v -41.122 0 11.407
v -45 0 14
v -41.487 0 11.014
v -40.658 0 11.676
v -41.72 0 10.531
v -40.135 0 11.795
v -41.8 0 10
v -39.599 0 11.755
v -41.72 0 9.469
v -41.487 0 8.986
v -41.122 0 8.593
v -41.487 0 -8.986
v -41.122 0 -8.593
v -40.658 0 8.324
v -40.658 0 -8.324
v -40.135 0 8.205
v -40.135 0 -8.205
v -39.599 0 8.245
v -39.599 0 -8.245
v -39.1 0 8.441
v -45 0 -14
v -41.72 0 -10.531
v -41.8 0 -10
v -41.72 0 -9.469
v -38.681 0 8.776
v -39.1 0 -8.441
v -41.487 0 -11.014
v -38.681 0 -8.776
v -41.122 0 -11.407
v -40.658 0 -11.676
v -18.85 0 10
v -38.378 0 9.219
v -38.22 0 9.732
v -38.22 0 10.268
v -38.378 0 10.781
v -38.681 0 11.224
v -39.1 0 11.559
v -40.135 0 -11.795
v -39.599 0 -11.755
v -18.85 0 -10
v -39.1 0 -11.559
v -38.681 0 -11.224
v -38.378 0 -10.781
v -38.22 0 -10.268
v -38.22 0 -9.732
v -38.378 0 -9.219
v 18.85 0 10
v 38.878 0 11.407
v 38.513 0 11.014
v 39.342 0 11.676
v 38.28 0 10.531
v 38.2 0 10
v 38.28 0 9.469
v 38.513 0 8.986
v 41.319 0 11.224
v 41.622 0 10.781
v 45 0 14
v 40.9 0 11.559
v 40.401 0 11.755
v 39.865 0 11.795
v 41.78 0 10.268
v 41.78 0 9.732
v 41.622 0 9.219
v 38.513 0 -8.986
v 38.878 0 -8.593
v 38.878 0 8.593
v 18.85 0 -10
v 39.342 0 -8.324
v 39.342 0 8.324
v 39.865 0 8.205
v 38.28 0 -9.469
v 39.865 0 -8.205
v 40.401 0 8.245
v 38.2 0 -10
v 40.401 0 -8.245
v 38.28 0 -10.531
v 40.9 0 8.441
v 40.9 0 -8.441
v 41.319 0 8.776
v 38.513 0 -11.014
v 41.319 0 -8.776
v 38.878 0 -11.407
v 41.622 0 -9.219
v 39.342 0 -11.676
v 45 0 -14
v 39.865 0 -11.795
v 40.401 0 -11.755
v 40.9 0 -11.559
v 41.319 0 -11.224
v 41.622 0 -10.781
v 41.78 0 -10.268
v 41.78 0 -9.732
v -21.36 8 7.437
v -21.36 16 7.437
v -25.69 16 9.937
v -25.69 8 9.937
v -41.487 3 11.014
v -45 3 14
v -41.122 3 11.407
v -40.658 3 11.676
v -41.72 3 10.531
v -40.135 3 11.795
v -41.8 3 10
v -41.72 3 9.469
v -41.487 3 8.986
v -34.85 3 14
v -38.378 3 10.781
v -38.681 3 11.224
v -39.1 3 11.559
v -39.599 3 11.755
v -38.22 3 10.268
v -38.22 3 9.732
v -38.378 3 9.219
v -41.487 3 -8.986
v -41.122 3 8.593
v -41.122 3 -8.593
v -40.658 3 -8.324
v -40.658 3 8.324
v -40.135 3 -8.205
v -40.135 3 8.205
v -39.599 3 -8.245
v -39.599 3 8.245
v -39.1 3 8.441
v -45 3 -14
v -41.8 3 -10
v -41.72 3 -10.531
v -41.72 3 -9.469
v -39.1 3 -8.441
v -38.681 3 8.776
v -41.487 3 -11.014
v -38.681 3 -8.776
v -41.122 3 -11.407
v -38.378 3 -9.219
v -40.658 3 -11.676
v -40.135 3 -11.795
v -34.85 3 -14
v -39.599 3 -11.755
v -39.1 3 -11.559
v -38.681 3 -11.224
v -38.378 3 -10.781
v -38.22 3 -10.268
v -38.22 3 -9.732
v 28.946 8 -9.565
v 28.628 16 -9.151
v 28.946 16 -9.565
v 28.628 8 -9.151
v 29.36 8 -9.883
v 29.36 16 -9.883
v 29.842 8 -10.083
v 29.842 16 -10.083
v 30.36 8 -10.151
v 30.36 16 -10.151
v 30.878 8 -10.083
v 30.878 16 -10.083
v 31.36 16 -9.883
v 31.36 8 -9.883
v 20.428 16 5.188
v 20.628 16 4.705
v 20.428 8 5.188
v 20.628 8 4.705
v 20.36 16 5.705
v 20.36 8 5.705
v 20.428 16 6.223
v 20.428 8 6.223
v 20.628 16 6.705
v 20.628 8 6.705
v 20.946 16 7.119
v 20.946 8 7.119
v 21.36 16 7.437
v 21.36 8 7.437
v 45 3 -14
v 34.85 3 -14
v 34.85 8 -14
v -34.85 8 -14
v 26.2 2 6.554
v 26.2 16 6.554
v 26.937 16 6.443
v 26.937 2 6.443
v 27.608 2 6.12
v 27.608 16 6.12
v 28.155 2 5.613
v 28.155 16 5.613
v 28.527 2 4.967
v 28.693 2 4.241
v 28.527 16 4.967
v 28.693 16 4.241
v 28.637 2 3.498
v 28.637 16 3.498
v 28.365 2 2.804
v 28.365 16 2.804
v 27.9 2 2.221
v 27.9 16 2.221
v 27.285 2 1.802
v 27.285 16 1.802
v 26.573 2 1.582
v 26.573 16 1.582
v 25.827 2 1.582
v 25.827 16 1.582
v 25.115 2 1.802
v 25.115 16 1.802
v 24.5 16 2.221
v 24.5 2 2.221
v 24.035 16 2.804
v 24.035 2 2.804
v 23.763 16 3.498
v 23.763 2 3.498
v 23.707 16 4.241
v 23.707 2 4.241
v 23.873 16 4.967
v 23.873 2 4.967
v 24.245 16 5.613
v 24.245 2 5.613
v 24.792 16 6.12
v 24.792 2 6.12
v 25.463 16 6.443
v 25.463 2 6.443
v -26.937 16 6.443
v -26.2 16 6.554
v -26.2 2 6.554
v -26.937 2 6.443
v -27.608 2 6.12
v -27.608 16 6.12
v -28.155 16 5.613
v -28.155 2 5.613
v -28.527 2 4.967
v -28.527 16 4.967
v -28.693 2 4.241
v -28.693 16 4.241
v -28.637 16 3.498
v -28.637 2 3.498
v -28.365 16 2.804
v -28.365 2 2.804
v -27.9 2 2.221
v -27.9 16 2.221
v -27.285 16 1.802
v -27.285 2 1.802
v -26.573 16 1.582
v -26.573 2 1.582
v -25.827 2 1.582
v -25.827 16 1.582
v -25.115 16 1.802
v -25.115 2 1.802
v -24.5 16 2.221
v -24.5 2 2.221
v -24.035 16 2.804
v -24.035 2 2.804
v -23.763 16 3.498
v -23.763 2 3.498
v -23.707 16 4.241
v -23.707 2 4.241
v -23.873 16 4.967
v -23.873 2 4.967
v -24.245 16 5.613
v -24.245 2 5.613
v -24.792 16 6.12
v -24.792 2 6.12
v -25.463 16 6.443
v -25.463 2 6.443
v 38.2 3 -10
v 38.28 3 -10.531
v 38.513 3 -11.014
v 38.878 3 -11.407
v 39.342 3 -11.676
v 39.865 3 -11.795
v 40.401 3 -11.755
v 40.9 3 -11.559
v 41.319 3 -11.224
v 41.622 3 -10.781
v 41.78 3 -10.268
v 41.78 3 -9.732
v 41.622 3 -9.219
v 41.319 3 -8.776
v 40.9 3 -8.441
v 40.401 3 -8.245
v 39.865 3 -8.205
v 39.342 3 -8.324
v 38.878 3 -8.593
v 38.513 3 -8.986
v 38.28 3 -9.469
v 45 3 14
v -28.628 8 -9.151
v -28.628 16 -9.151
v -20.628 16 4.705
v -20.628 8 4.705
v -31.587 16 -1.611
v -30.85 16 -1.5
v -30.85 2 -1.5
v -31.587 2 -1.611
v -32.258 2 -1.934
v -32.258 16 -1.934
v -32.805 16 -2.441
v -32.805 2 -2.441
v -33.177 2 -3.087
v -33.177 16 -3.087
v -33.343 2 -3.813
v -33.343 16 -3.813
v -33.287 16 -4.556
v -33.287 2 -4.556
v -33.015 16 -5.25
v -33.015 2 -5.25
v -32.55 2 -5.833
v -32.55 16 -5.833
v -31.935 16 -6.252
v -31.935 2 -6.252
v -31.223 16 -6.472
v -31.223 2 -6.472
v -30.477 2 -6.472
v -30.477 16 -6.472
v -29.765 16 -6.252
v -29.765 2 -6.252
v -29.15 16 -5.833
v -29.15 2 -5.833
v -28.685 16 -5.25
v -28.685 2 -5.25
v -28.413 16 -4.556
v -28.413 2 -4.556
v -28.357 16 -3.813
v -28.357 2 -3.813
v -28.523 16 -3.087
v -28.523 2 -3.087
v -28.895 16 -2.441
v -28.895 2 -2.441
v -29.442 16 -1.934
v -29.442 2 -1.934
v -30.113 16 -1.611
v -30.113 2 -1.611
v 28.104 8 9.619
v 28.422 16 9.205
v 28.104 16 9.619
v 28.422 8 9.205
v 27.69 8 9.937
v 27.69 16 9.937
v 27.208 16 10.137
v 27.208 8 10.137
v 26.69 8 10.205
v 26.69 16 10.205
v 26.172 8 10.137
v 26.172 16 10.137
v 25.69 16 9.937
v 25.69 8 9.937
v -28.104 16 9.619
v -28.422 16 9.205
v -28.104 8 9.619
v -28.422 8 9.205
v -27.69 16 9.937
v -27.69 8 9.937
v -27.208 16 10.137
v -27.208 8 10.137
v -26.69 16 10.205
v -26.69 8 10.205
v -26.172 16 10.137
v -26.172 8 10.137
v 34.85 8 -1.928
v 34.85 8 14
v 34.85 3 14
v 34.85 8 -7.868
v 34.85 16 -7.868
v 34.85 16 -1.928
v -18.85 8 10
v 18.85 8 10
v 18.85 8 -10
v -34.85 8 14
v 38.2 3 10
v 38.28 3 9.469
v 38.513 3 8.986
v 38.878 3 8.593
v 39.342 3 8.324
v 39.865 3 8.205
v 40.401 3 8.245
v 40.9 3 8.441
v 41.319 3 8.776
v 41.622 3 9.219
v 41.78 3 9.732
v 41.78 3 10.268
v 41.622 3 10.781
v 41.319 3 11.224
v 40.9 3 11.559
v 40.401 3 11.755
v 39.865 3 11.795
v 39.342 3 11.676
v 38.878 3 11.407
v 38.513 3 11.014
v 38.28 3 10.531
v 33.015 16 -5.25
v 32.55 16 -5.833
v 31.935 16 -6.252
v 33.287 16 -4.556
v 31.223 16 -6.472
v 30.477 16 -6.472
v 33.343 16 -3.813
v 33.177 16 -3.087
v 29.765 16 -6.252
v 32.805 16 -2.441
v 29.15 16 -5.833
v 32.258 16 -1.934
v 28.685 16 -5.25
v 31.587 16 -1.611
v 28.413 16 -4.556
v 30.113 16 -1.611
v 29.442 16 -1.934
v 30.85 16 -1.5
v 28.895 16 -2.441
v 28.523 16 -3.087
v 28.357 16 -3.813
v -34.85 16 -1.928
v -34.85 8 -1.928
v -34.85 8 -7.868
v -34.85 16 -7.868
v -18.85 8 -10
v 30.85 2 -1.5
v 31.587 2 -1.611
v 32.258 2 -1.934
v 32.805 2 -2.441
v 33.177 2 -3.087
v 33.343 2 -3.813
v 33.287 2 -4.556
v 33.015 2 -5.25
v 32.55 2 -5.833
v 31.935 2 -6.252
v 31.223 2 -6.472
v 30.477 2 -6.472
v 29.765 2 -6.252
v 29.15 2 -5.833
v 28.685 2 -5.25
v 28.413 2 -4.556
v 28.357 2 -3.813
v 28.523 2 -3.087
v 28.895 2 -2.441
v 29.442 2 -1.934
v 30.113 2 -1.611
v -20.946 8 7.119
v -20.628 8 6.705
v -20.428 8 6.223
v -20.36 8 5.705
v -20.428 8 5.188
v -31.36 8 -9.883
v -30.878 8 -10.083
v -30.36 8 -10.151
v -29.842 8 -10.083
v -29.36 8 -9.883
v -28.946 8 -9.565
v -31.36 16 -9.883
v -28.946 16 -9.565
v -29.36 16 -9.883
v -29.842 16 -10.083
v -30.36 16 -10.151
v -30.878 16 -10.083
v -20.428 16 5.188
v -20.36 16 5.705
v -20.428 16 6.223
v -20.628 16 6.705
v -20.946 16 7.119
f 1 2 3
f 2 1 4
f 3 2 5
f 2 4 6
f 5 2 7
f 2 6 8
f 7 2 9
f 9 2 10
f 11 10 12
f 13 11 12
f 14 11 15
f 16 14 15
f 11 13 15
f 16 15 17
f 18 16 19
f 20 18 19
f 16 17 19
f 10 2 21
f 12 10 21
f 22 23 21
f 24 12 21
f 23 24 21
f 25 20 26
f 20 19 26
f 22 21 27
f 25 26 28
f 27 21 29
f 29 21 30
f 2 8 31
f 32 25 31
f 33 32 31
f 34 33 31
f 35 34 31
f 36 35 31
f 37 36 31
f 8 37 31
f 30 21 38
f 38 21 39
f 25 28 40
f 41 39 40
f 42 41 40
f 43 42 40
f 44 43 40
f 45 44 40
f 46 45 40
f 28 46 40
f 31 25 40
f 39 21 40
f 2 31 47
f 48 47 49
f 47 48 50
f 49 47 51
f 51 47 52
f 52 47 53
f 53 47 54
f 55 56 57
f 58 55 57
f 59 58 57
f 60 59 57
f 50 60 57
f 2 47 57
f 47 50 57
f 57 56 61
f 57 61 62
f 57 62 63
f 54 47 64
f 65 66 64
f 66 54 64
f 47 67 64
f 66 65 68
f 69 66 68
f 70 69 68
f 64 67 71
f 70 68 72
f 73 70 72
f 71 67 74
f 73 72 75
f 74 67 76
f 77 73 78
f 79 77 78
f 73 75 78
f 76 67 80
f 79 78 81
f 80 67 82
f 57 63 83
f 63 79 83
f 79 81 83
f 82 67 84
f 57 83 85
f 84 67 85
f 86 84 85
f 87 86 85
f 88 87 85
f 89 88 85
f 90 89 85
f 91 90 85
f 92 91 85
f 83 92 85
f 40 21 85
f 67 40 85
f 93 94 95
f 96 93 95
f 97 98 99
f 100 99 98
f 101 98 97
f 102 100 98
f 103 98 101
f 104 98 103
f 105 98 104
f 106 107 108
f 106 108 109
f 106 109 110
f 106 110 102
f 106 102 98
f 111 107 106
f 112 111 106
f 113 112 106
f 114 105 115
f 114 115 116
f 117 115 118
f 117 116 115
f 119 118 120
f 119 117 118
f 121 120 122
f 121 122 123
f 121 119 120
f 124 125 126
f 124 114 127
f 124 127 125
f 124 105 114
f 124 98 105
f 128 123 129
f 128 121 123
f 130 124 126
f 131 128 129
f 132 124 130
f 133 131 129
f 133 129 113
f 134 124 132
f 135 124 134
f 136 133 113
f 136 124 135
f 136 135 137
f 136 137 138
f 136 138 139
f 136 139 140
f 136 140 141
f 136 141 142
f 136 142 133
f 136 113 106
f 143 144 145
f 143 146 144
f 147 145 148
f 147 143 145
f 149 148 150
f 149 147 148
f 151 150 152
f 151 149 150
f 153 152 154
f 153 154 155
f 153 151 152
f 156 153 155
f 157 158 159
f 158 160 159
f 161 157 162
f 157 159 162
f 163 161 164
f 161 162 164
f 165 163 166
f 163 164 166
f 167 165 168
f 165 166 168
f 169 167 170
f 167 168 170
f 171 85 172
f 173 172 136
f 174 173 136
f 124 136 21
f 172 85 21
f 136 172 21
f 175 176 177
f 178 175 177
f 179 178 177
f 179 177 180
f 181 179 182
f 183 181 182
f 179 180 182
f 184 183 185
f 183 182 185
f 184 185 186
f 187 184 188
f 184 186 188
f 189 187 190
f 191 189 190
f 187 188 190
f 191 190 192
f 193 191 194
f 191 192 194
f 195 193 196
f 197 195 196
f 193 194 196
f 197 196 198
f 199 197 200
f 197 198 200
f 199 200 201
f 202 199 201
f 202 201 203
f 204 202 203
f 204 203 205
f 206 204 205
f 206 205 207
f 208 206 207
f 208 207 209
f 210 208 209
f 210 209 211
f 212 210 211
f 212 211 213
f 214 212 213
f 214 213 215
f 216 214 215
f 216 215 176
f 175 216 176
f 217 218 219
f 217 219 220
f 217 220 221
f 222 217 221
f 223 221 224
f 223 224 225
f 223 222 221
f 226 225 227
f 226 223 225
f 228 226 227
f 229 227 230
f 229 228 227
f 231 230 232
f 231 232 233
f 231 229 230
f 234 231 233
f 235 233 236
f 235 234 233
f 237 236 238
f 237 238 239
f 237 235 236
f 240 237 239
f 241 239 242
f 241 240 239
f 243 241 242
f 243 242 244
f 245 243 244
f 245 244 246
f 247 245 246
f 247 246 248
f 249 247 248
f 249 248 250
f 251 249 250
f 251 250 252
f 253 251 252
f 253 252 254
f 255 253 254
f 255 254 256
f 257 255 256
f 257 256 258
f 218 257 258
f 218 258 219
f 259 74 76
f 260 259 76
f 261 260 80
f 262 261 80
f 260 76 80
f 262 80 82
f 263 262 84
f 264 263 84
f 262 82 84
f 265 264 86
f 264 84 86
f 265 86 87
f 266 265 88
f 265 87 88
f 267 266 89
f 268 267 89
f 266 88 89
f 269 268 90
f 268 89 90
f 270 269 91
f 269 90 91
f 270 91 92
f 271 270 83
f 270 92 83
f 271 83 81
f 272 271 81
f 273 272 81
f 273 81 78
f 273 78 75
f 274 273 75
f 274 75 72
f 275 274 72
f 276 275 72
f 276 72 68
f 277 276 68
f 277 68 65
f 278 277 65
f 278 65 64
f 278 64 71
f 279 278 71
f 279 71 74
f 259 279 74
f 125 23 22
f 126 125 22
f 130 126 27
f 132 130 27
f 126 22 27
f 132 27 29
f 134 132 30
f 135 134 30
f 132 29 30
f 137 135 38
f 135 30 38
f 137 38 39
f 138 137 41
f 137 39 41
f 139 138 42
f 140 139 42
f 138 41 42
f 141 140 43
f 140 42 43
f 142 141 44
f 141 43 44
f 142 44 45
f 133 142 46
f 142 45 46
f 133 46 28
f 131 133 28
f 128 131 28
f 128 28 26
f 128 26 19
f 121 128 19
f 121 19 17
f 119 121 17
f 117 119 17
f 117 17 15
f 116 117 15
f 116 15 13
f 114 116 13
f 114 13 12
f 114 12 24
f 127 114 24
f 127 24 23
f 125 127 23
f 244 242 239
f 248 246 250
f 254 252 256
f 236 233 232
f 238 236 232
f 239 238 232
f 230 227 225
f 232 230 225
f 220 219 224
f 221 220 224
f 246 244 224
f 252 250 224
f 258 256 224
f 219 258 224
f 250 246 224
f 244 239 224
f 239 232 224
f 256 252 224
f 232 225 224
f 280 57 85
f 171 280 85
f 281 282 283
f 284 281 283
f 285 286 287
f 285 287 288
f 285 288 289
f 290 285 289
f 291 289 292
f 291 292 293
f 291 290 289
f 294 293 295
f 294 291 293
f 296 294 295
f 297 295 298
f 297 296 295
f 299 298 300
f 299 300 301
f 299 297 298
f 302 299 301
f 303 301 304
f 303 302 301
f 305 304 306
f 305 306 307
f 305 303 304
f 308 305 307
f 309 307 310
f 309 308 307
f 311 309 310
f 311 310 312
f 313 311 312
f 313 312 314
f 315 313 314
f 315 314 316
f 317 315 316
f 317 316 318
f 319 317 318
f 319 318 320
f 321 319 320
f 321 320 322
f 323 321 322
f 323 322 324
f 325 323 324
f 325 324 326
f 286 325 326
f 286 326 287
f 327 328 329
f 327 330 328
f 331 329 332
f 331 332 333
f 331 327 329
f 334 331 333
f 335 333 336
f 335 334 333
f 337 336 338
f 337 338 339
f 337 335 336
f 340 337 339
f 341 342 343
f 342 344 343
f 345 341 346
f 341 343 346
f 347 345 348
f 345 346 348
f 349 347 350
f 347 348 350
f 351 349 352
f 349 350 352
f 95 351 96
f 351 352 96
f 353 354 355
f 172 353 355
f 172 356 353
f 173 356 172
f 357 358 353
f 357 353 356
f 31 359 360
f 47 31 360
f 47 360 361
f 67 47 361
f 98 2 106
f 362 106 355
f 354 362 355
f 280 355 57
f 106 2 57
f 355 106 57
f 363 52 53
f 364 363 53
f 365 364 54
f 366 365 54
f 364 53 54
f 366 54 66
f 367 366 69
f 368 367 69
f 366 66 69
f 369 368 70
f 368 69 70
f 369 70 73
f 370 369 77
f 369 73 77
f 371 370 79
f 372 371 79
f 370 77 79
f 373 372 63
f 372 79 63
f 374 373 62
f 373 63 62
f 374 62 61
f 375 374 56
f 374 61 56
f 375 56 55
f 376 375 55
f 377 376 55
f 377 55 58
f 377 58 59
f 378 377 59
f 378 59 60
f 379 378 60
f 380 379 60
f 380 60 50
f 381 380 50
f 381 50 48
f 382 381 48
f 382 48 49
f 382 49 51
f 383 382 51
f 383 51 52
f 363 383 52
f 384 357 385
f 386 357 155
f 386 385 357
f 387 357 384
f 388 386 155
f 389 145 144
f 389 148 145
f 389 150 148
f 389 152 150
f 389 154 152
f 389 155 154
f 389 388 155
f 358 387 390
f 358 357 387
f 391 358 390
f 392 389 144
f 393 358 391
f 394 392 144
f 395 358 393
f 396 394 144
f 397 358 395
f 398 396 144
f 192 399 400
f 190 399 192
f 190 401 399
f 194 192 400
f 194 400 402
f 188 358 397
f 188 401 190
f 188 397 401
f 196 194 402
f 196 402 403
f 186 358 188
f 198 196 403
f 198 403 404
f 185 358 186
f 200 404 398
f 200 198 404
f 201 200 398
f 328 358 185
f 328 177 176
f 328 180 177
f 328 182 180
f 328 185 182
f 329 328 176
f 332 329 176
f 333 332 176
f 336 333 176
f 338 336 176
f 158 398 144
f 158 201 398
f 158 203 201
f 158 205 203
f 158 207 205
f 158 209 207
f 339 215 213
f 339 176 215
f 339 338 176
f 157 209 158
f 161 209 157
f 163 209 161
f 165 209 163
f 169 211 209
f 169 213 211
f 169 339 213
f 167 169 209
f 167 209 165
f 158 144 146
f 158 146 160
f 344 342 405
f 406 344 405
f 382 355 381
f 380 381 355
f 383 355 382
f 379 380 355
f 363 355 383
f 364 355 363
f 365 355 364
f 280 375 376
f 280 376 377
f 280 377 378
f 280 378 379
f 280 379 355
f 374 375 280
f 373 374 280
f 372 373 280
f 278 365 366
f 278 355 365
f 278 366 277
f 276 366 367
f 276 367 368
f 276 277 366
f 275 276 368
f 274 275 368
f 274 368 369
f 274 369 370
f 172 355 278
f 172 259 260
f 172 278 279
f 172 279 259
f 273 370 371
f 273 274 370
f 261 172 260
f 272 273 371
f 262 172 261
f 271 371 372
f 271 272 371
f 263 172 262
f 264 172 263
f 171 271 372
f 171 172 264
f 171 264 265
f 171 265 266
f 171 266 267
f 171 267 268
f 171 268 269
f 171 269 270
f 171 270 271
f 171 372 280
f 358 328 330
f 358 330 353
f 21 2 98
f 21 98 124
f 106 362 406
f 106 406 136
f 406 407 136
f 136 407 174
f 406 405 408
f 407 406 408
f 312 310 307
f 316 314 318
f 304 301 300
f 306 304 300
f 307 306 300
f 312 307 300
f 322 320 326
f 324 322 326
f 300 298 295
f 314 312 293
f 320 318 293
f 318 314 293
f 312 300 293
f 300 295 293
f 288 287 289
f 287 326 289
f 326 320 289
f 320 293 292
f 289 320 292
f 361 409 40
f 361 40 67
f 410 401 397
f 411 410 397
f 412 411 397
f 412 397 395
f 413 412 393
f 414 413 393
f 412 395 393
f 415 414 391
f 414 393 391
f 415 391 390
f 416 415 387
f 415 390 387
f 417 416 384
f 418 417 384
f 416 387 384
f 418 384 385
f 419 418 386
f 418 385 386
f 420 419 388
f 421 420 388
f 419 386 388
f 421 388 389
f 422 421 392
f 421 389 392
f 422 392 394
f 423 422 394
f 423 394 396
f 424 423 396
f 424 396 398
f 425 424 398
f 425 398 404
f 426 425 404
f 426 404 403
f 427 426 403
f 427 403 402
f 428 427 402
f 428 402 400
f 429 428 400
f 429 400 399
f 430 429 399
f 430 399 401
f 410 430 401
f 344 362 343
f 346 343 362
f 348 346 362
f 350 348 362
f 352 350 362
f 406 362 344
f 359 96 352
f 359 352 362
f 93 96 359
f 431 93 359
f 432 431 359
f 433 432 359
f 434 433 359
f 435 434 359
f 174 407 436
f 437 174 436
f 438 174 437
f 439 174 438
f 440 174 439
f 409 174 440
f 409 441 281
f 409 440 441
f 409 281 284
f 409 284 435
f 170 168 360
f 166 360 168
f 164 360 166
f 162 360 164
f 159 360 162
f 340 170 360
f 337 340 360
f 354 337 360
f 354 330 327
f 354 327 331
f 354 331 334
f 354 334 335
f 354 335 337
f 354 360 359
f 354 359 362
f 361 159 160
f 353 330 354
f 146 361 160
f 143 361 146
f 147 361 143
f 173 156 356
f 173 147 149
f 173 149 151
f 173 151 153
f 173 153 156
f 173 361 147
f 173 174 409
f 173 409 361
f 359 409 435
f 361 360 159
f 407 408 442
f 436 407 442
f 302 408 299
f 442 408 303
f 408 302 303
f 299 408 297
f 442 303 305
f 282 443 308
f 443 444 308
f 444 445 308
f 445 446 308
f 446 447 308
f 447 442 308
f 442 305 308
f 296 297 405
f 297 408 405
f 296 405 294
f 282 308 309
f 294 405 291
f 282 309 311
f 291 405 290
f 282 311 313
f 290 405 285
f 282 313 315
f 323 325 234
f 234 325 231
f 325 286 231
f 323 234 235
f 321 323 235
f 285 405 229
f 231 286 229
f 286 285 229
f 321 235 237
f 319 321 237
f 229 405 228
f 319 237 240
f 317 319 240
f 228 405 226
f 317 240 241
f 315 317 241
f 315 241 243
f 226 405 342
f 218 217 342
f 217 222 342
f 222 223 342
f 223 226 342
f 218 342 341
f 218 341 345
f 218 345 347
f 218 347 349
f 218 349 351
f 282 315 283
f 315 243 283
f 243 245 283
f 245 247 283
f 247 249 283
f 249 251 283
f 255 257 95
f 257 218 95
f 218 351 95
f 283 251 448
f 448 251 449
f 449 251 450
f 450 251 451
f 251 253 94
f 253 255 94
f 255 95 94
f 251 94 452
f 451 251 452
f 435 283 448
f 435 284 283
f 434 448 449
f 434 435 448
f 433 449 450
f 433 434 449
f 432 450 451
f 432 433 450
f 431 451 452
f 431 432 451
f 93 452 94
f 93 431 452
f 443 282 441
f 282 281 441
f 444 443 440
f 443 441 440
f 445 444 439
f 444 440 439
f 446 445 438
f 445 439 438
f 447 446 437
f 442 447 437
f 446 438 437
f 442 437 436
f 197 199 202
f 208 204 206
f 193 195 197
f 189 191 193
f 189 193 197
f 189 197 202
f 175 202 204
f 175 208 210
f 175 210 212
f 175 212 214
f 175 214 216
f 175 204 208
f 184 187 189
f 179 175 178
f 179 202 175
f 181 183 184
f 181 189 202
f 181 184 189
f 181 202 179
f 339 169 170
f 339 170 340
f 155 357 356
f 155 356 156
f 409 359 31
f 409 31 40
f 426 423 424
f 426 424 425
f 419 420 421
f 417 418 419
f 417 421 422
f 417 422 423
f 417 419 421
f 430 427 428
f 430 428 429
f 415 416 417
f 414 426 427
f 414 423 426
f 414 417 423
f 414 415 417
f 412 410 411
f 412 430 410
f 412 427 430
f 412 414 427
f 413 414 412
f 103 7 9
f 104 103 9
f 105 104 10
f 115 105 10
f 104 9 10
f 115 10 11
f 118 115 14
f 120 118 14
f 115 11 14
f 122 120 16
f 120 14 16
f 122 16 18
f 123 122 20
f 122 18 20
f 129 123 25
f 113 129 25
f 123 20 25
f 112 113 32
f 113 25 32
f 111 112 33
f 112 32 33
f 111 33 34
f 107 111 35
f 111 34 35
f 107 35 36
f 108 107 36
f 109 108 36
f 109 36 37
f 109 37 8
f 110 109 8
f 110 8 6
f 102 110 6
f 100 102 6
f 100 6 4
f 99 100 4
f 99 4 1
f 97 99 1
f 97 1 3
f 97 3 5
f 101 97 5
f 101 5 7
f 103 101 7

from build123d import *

# Parameters (mm, degrees)
SKETCH1_W                = 10.15
SKETCH1_H                = 28
SKETCH1_W_2              = 69.7
BOSS_EXTRUDE1_DEPTH      = 3
SKETCH1_3_W              = 69.7
SKETCH1_3_H              = 28
BOSS_EXTRUDE2_DEPTH      = 8
SKETCH2_R                = 2.5
CUT_EXTRUDE1_DEPTH       = 6
BOSS_EXTRUDE3_START      = -8
SKETCH3_R                = 2.5
BOSS_EXTRUDE3_DEPTH      = 8
FILLET1_R                = 2
FILLET1_OF_MIRROR1_R     = 2
M3_CLEARANCE_HOLE1_D     = 3.6
M3_CLEARANCE_HOLE1_DEPTH = 10
M3_CLEARANCE_HOLE1_TIP   = 1.081549114
SKETCH6_W                = 37.7
SKETCH6_H                = 20
CUT_EXTRUDE2_DEPTH       = 48.801673611


with BuildPart() as part:
    # Sketch1 → Boss-Extrude1 (new body)
    with BuildSketch(Plane(origin=(0, 0, 0), x_dir=(1, 0, 0), z_dir=(0, 1, 0))):
        with Locations((-39.925, 0)):
            Rectangle(SKETCH1_W, SKETCH1_H)
        Rectangle(SKETCH1_W_2, SKETCH1_H)
        with Locations((39.925, 0)):
            Rectangle(SKETCH1_W, SKETCH1_H)
    extrude(amount=BOSS_EXTRUDE1_DEPTH)

    # Sketch1<3> → Boss-Extrude2 (add)
    with BuildSketch(Plane(origin=(0, 0, 0), x_dir=(1, 0, 0), z_dir=(0, 1, 0))):
        Rectangle(SKETCH1_3_W, SKETCH1_3_H)
    extrude(amount=BOSS_EXTRUDE2_DEPTH)

    # Sketch2 → Cut-Extrude1 (cut)
    with BuildSketch(Plane.XZ.offset(-8)):
        with Locations(Location((-30.85, -4, 0), (0, 0, 90))):
            Circle(SKETCH2_R)
        with Locations(Location((-26.2, 4.054036255, 0), (0, 0, 90))):
            Circle(SKETCH2_R)
    cut_extrude1 = extrude(amount=CUT_EXTRUDE1_DEPTH, mode=Mode.SUBTRACT)

    # Sketch3 → Boss-Extrude3 (add)
    with BuildSketch(Plane.XZ.offset(-8).offset(BOSS_EXTRUDE3_START)):
        Polygon((-29.627885683, -10.88323591), (-19.627885683, 6.437272165), (-27.422114317, 10.937272165), (-34.85, -1.92820323), (-34.85, -7.868246804), align=None)
        with Locations(Location((-30.85, -4, 0), (0, 0, 90))):
            Circle(SKETCH3_R, mode=Mode.SUBTRACT)
        with Locations(Location((-26.2, 4.054036255, 0), (0, 0, 90))):
            Circle(SKETCH3_R, mode=Mode.SUBTRACT)
    boss_extrude3 = extrude(amount=BOSS_EXTRUDE3_DEPTH)

    # Fillet1
    fillet1_edges = [part.edges().sort_by_distance(p)[0] for p in [
        (-27.422114317, 12, 10.937272165),
        (-19.627885683, 12, 6.437272165),
        (-29.627885683, 12, -10.88323591),
    ]]
    fillet(fillet1_edges, radius=FILLET1_R)

    # Mirror1: Cut-Extrude1, Boss-Extrude3 across plane
    add(cut_extrude1.mirror(Plane(origin=(0, 0, 0), x_dir=(0, 0, 1), z_dir=(1, 0, 0))), mode=Mode.SUBTRACT)
    add(boss_extrude3.mirror(Plane(origin=(0, 0, 0), x_dir=(0, 0, 1), z_dir=(1, 0, 0))))

    # Fillet1 of Mirror1
    fillet1_of_mirror1_edges = [part.edges().sort_by_distance(p)[0] for p in [
        (27.422114317, 12, 10.937272165),
        (19.627885683, 12, 6.437272165),
        (29.627885683, 12, -10.88323591),
    ]]
    fillet(fillet1_of_mirror1_edges, radius=FILLET1_OF_MIRROR1_R)

    # M3 Clearance Hole1
    with Locations(Plane(origin=(0, 3, 0), x_dir=(1, 0, 0), z_dir=(0, 1, 0))):
        with Locations((-40, 10), (-40, -10), (40, -10), (40, 10)):
            Hole(M3_CLEARANCE_HOLE1_D / 2, depth=M3_CLEARANCE_HOLE1_DEPTH)
            with Locations((0, 0, -(M3_CLEARANCE_HOLE1_DEPTH + M3_CLEARANCE_HOLE1_TIP / 2))):  # 118° drill point
                Cone(0, M3_CLEARANCE_HOLE1_D / 2, M3_CLEARANCE_HOLE1_TIP, mode=Mode.SUBTRACT)

    # Sketch6 → Cut-Extrude2 (cut, through all)
    with BuildSketch(Plane(origin=(0, 8, 0), x_dir=(1, 0, 0), z_dir=(0, 1, 0))):
        Rectangle(SKETCH6_W, SKETCH6_H)
    extrude(amount=-CUT_EXTRUDE2_DEPTH, mode=Mode.SUBTRACT)


solid = part.part
